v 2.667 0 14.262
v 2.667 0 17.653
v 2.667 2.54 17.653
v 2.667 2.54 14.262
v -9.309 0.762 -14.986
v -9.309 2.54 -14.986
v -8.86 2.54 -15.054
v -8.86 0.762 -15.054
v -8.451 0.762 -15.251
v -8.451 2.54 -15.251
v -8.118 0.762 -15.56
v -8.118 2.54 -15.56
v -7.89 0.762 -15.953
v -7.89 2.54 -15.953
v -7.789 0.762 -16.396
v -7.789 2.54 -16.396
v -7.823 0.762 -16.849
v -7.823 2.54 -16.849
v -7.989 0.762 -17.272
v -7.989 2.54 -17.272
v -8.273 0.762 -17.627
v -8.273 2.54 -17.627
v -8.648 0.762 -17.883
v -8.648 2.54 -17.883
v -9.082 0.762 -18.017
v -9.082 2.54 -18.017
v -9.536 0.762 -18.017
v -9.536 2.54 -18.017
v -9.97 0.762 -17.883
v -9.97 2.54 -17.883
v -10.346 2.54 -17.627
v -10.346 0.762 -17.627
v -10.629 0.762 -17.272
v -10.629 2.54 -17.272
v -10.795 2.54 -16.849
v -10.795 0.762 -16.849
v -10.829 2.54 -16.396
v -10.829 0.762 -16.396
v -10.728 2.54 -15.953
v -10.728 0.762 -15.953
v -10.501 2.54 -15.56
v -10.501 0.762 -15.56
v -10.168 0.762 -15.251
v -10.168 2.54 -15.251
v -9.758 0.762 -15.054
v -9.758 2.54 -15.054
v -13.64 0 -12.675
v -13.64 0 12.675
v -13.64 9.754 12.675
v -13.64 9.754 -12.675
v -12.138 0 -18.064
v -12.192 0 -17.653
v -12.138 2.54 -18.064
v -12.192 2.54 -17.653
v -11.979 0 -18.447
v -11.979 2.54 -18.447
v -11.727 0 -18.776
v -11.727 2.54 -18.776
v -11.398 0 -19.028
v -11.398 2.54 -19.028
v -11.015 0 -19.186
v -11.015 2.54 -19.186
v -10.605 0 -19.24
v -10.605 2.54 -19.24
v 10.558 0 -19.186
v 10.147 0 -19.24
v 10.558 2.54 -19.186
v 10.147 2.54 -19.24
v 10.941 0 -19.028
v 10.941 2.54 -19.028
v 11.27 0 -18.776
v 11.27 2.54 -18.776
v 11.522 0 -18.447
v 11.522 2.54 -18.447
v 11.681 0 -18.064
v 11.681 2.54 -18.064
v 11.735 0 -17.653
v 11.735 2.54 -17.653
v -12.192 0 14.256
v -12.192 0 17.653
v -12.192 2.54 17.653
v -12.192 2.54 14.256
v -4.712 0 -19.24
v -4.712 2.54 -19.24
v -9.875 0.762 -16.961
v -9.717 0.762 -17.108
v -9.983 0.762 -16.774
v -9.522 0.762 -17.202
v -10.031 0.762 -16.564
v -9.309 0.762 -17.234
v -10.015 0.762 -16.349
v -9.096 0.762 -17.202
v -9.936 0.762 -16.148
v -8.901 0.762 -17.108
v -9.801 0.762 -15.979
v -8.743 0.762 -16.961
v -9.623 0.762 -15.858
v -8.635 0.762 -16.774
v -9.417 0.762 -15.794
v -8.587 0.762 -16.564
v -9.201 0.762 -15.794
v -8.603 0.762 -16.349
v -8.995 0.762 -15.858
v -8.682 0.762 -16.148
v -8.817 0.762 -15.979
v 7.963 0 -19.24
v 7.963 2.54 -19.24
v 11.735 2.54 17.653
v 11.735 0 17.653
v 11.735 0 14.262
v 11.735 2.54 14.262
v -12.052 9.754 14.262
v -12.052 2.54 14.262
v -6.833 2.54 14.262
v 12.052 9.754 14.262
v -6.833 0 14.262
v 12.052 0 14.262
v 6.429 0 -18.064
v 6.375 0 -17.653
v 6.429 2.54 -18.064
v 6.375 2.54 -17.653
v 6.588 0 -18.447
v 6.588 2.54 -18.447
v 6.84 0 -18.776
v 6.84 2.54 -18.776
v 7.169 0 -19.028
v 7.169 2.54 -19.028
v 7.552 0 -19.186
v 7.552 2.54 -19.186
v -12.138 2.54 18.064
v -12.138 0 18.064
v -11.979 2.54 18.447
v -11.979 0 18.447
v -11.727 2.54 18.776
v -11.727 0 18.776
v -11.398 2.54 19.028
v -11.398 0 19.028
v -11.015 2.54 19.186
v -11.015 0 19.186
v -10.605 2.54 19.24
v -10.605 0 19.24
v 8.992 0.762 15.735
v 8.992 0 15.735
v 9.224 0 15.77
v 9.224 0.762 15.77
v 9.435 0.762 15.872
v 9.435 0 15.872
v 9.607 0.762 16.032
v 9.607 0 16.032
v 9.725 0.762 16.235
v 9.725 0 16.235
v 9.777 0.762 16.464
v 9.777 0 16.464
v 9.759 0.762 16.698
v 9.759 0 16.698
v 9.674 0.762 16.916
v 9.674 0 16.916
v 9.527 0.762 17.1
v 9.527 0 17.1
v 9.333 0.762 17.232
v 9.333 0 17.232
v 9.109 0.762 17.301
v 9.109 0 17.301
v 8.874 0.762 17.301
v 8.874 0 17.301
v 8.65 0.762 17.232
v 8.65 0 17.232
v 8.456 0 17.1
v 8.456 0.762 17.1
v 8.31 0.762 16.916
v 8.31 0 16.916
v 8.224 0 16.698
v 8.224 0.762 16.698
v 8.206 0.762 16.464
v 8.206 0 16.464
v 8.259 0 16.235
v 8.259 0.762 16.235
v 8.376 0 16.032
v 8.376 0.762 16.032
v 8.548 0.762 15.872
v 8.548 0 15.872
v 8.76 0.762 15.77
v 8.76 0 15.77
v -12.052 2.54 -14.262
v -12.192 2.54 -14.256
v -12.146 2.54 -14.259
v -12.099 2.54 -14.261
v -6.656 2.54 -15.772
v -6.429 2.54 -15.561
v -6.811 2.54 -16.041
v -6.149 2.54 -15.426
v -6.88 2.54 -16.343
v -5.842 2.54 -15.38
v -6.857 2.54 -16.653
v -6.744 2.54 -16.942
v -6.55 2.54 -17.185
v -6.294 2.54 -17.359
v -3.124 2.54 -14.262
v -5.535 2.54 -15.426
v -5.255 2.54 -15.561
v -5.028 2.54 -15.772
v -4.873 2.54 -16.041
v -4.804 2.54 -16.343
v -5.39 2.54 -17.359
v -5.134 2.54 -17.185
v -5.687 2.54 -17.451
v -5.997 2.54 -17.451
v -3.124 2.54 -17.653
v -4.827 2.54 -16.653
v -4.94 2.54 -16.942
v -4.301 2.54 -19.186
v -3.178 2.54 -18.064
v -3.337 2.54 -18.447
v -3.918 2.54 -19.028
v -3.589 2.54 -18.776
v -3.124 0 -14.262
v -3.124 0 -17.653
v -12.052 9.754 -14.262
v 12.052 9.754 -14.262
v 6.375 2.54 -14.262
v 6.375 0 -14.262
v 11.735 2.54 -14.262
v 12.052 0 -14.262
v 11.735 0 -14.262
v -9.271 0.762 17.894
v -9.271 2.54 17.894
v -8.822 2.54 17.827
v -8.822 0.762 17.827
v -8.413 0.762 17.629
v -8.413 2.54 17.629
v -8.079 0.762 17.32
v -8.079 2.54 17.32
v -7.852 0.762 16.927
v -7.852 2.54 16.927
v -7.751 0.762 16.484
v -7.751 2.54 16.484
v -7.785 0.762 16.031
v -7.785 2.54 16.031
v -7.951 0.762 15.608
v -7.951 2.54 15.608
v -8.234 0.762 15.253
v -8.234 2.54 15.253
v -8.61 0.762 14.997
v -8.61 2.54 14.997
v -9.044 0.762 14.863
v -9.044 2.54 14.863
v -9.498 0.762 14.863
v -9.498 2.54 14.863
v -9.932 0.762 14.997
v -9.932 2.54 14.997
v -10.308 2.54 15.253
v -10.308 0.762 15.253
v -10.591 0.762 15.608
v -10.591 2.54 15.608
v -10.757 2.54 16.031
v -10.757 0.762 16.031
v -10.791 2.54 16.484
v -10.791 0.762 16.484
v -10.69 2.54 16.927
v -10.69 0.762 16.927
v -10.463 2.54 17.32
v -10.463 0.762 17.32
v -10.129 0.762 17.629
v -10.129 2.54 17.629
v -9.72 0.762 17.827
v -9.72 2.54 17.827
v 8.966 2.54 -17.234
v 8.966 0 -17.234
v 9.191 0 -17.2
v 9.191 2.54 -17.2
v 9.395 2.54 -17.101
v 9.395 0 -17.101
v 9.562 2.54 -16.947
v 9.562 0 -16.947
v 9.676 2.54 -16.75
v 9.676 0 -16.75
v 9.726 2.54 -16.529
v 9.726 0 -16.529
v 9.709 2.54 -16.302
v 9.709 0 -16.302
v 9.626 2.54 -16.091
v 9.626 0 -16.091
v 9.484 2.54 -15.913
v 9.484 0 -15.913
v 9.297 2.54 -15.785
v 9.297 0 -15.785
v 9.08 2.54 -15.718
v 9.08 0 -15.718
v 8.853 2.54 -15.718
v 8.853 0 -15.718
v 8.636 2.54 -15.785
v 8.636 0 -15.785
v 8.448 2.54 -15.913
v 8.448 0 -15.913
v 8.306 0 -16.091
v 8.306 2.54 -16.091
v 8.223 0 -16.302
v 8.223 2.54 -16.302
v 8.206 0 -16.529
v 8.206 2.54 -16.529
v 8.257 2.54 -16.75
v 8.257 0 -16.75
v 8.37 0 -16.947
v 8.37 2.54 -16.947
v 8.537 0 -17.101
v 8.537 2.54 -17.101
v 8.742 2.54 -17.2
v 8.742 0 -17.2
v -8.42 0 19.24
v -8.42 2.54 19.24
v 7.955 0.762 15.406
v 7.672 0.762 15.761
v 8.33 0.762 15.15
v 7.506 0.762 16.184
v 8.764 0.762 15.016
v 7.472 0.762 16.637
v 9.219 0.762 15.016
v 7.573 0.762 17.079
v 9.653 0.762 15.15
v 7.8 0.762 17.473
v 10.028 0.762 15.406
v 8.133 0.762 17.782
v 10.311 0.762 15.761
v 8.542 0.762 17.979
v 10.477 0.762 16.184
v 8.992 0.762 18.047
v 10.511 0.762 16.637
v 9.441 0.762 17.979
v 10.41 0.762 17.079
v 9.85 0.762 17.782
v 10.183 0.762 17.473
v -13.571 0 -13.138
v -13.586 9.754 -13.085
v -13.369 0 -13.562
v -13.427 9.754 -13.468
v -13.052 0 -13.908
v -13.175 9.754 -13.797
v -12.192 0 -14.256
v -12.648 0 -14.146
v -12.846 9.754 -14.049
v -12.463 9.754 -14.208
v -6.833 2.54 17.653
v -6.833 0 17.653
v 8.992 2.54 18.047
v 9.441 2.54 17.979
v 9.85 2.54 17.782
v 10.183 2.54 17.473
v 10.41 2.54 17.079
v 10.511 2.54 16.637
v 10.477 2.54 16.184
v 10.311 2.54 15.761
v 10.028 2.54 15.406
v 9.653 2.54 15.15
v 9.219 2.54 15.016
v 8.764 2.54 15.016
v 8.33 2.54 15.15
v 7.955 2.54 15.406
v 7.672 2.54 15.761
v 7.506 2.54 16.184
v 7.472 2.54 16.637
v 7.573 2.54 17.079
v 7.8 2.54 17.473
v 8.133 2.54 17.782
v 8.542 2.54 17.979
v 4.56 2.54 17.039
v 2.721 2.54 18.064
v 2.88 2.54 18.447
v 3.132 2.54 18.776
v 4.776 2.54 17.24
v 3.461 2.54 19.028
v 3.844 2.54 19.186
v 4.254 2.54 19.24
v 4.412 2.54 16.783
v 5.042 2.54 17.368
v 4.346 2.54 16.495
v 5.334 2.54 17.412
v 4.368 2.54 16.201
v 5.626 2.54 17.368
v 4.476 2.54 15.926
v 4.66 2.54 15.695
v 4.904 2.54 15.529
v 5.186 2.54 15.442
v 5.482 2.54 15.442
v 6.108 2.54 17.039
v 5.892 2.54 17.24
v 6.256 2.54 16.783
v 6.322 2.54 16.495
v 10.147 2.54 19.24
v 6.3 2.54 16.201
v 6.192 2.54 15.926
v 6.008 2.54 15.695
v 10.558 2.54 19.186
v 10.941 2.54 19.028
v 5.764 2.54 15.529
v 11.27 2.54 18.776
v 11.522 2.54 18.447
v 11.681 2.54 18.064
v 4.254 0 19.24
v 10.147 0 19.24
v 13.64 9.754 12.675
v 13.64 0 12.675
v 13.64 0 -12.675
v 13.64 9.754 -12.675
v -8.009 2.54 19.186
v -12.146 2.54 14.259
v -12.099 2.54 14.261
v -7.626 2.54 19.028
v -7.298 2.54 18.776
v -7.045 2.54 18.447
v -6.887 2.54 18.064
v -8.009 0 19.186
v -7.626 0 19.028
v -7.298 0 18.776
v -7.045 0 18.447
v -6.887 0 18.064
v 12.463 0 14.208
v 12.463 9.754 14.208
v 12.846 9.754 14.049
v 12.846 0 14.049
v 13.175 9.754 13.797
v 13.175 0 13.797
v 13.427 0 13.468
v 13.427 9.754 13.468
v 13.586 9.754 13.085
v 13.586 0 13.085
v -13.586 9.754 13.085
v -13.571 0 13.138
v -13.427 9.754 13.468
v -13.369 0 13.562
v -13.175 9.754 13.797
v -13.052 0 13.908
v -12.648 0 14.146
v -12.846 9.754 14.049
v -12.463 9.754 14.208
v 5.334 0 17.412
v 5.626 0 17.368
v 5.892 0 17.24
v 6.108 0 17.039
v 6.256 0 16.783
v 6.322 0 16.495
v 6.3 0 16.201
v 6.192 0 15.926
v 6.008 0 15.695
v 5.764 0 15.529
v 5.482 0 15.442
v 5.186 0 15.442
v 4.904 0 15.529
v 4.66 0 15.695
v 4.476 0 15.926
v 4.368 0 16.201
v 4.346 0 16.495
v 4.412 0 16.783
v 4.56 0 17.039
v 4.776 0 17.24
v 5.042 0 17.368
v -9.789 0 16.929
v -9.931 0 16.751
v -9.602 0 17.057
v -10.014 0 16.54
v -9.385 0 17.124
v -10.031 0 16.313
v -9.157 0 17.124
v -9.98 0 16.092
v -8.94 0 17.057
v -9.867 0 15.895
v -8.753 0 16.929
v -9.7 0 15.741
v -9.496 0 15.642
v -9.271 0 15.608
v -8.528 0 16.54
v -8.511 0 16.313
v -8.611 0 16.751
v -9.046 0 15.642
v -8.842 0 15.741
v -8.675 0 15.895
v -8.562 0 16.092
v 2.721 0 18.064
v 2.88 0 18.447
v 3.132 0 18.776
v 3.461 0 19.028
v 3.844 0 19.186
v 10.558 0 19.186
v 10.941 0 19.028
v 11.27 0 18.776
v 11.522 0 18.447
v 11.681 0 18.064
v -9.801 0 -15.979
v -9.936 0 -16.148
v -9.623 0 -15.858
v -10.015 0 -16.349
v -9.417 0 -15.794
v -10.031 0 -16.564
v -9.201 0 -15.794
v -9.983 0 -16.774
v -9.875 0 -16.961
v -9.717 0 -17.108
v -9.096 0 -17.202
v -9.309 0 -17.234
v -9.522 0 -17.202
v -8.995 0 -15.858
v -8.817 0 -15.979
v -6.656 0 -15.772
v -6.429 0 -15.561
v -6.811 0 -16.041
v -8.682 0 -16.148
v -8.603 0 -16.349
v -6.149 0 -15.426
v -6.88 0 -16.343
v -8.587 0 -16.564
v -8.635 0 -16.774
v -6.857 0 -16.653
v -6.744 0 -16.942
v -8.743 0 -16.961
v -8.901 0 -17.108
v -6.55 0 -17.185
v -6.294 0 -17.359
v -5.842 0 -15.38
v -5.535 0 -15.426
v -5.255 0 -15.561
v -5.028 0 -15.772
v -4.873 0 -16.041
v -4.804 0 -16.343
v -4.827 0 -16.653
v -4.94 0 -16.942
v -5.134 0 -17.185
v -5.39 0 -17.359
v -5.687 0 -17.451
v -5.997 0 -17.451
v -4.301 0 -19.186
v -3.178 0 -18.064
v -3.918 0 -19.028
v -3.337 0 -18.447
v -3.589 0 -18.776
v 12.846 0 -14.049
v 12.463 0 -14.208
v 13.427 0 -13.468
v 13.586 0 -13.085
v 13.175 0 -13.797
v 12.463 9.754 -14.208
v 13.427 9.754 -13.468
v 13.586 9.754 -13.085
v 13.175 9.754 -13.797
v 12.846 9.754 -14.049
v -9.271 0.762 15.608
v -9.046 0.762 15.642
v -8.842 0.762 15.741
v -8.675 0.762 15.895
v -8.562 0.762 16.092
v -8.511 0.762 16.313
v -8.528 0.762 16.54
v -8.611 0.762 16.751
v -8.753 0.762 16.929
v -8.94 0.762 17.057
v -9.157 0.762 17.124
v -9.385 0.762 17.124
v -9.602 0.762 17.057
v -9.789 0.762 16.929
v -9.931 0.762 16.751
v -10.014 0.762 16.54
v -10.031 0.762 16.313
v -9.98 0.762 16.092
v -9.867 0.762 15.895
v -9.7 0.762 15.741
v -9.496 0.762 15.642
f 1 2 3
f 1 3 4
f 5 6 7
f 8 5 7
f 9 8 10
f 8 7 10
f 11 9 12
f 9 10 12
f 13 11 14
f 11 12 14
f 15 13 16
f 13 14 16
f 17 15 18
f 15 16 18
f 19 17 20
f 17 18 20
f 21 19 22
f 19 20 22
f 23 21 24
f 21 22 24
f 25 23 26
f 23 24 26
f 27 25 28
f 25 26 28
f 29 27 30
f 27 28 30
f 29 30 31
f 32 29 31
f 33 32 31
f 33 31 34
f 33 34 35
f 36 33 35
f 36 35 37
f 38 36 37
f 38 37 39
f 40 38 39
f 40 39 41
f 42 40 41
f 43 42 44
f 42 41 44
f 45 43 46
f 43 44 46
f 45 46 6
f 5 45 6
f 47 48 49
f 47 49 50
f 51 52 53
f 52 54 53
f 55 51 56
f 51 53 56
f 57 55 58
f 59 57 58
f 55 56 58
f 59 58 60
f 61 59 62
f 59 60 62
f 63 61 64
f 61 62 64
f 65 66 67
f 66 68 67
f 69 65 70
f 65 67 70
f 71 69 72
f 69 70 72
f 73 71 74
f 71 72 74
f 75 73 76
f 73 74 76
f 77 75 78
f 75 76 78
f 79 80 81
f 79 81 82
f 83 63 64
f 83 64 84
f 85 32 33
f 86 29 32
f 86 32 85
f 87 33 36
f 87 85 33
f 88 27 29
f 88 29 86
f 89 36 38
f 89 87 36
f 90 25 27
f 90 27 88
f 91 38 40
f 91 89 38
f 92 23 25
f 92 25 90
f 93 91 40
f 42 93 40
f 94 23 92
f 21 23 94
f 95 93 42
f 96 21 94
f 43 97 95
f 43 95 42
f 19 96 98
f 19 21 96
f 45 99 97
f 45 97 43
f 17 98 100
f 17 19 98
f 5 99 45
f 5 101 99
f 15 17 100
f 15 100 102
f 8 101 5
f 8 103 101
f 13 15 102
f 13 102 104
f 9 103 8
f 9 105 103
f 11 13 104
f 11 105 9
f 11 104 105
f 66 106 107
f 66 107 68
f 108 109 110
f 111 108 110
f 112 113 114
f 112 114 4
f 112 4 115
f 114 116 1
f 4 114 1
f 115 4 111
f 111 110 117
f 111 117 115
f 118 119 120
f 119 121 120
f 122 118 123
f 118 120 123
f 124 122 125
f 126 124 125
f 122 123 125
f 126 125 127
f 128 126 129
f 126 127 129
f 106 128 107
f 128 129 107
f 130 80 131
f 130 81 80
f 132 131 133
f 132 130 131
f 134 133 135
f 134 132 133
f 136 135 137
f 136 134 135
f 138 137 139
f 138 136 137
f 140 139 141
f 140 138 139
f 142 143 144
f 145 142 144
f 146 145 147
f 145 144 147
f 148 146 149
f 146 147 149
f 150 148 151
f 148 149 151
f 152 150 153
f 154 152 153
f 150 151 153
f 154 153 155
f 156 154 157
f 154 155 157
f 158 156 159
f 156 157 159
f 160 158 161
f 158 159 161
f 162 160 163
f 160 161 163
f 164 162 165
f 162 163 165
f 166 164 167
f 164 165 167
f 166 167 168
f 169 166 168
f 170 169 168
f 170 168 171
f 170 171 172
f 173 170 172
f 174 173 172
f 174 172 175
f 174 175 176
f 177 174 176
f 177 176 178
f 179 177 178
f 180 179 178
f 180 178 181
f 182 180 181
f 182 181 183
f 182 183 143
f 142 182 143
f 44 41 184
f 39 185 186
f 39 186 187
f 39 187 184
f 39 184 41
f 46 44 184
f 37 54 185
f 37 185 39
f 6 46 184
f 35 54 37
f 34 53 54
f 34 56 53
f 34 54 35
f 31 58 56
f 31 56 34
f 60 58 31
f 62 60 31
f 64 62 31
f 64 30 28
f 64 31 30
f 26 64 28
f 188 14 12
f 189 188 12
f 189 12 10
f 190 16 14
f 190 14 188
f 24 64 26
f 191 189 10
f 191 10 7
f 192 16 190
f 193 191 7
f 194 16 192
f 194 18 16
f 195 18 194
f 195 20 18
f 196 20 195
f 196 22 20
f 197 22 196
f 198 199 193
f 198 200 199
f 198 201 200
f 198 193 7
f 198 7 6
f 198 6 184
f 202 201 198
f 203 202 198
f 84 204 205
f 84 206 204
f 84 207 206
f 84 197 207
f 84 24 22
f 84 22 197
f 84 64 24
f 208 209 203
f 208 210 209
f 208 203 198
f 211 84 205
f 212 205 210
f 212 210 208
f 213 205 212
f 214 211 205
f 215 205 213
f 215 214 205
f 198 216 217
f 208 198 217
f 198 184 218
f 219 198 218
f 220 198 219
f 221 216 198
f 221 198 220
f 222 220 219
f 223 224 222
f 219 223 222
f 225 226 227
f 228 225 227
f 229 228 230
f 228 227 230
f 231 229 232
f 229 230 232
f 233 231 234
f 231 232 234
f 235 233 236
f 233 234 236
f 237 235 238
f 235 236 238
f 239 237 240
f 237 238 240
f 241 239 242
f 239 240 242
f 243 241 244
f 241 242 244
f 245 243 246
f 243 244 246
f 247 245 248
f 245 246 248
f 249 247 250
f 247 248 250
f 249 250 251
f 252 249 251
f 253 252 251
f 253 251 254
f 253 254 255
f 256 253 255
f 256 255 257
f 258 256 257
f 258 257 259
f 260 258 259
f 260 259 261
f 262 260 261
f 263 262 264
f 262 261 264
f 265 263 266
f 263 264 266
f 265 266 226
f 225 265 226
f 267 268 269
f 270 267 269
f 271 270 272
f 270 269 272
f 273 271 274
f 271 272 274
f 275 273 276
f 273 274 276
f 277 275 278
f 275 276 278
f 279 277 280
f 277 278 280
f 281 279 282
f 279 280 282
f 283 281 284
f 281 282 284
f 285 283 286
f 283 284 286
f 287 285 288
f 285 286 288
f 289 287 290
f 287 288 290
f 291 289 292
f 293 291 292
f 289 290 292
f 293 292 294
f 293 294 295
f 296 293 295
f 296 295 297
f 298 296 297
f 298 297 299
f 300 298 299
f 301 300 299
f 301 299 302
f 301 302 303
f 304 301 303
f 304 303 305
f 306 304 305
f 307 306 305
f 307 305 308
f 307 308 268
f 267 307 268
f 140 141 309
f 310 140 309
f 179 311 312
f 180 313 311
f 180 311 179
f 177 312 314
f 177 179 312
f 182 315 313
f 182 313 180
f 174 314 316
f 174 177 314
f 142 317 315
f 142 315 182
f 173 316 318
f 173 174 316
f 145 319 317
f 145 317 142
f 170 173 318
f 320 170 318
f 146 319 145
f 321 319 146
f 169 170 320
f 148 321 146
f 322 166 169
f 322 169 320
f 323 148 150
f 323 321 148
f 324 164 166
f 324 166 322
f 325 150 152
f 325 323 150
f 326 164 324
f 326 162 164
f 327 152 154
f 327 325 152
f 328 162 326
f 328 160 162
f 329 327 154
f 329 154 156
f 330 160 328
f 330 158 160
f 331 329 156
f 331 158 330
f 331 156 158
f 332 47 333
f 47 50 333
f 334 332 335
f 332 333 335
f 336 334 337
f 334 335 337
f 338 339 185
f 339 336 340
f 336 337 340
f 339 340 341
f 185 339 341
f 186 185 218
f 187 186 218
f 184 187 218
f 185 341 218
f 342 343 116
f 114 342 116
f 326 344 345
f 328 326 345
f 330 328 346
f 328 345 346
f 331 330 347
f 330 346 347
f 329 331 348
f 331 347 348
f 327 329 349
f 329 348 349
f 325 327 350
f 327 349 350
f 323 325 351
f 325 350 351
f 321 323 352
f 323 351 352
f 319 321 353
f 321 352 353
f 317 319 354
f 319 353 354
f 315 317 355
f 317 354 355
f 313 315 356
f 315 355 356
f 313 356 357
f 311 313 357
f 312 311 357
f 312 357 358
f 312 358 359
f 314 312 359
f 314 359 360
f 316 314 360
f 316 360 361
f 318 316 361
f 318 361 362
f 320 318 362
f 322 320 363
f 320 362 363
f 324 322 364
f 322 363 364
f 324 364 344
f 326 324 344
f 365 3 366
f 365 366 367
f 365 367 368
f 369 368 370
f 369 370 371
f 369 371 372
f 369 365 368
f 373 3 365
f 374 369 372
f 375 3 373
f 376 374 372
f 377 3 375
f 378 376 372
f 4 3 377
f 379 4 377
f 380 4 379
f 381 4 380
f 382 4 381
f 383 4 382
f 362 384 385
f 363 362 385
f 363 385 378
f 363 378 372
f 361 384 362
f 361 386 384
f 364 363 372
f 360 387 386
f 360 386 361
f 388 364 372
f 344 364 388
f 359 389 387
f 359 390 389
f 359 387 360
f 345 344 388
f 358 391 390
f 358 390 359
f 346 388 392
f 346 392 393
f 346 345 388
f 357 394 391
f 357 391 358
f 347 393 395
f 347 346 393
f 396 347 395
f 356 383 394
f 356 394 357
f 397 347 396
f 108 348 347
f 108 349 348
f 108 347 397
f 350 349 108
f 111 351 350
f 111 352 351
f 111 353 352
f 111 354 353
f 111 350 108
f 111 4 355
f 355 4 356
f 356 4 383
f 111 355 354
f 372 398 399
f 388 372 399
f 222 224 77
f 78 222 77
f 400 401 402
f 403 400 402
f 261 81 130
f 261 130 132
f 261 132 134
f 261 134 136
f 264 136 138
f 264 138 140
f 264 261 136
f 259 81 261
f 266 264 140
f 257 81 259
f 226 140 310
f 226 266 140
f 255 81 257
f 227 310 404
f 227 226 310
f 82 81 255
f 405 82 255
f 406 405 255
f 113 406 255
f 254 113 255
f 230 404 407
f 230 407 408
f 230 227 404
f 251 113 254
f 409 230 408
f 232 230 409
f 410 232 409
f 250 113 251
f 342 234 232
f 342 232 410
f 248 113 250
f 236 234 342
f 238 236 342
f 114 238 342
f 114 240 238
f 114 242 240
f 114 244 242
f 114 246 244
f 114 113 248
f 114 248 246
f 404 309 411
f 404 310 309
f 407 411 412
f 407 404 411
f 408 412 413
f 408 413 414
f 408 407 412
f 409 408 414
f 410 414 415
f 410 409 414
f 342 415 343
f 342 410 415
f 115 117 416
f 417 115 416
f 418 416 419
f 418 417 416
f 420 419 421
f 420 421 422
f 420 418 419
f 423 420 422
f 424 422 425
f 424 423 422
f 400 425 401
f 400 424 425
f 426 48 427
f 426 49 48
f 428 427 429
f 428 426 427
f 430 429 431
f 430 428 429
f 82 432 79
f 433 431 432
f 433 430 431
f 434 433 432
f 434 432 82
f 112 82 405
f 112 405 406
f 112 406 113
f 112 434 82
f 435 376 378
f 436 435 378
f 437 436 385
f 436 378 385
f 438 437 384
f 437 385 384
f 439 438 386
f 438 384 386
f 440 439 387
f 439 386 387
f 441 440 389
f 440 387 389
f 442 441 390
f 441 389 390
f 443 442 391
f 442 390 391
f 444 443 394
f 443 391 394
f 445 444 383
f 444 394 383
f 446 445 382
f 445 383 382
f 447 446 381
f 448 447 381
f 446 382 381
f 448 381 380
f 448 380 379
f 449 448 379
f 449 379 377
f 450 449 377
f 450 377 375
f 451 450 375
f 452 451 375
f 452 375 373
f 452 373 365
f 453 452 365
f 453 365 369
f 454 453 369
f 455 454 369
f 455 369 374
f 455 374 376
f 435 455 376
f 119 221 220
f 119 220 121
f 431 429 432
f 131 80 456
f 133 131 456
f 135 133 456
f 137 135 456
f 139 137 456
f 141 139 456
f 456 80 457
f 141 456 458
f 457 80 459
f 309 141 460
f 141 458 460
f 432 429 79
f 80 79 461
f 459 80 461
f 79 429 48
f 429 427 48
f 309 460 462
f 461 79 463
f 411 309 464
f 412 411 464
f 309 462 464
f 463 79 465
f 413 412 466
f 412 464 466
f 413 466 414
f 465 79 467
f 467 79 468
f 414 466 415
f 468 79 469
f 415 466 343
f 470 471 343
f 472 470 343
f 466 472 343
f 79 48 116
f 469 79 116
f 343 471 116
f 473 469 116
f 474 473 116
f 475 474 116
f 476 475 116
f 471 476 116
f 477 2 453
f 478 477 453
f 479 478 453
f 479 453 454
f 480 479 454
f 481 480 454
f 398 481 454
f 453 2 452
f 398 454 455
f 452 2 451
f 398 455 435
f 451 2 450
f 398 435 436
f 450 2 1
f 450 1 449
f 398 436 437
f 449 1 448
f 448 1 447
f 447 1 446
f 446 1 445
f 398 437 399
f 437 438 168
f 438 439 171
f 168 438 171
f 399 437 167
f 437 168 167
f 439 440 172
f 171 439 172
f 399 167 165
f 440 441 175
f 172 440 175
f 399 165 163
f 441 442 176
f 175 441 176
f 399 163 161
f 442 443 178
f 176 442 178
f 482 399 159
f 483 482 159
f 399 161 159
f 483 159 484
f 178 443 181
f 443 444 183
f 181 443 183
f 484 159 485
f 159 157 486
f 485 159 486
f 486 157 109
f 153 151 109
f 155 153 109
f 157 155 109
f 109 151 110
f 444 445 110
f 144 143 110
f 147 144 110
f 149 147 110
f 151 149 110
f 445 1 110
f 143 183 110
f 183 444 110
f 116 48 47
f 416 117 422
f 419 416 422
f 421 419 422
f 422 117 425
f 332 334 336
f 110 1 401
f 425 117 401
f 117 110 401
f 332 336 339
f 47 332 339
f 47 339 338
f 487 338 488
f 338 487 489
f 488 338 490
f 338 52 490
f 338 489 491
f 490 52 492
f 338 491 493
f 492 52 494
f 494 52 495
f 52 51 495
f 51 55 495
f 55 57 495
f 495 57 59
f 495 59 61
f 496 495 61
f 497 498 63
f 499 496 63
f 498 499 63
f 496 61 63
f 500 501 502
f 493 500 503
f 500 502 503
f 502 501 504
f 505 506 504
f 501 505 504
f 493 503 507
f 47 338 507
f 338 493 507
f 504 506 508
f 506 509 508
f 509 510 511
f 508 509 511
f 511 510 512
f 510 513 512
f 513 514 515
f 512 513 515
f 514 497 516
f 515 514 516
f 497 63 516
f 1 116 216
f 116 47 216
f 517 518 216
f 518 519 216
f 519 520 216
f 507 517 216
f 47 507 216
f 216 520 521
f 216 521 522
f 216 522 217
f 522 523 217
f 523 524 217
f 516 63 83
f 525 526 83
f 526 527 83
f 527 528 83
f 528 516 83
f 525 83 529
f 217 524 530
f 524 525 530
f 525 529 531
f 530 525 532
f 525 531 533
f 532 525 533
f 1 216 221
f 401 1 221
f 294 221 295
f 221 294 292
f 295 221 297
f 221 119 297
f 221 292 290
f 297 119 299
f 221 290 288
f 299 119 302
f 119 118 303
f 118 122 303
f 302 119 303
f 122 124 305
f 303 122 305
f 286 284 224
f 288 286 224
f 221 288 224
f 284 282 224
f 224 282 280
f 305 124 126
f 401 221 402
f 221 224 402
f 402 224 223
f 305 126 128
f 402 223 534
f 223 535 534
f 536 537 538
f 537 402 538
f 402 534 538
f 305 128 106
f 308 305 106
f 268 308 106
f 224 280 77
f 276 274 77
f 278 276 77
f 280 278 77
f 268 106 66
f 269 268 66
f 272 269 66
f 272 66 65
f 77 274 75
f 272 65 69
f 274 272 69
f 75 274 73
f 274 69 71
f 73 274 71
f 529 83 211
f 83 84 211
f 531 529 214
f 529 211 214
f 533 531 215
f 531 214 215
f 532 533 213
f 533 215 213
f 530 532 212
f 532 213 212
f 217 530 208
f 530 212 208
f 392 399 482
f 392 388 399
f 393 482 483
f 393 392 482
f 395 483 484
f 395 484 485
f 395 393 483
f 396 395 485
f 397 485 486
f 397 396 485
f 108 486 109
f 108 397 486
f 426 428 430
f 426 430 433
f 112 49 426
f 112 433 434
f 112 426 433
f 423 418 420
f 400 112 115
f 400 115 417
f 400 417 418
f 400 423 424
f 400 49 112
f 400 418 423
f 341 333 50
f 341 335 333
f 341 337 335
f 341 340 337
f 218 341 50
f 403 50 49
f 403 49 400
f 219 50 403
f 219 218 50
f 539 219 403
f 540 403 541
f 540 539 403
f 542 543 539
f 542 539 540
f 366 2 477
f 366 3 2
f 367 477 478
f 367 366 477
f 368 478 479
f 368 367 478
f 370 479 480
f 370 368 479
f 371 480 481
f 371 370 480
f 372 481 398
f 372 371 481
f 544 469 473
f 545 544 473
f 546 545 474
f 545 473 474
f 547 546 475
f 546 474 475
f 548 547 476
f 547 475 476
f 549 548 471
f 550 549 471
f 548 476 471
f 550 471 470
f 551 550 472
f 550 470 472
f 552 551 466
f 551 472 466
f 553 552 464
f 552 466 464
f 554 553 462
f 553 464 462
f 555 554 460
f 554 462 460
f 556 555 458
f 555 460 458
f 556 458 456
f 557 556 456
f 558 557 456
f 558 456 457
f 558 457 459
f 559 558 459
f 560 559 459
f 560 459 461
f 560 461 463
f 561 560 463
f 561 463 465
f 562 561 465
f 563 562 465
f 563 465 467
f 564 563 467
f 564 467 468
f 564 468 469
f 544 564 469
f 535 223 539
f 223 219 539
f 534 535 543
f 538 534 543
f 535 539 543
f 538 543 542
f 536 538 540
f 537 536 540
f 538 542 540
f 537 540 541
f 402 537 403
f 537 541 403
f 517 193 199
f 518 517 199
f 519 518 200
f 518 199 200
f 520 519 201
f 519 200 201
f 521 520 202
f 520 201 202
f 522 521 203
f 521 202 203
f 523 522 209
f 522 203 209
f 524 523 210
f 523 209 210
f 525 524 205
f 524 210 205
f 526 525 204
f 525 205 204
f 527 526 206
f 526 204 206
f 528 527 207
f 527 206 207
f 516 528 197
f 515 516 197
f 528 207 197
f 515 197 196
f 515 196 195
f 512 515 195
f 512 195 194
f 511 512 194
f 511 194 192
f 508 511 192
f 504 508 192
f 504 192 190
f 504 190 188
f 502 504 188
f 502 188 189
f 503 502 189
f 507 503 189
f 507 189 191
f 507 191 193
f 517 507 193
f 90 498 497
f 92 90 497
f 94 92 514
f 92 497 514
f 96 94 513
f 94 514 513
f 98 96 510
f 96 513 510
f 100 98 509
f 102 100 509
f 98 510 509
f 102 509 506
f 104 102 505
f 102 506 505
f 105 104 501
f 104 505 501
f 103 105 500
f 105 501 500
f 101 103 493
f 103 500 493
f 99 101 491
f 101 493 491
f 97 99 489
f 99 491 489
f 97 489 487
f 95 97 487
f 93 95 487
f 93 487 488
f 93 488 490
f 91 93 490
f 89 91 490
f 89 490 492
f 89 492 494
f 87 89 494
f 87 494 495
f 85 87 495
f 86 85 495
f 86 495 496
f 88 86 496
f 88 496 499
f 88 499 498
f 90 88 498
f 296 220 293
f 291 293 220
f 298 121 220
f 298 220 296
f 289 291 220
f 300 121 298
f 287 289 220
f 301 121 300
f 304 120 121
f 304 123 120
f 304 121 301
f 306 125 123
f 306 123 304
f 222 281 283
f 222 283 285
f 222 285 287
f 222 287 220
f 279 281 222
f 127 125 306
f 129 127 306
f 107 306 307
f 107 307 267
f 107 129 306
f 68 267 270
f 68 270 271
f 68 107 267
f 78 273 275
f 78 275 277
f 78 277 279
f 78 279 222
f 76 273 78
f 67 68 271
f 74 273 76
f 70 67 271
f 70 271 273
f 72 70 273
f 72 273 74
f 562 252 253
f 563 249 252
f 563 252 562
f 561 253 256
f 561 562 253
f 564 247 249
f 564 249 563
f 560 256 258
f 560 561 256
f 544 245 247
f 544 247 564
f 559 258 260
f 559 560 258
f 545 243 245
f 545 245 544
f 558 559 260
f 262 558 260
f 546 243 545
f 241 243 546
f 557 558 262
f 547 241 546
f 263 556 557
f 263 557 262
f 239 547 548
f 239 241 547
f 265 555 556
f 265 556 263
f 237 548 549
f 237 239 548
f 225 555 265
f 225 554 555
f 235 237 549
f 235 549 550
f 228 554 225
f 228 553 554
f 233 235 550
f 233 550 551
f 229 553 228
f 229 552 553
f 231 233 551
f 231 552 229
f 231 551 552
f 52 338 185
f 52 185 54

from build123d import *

# Parameters (mm, degrees)
SKETCH1_W                  = 27.2796
SKETCH1_H                  = 28.5242
ENCLOSURE_DEPTH            = 9.7536
SKETCH2_W                  = 9.0678
SKETCH2_H                  = 4.9784
SKETCH2_W_2                = 5.3594
MOUNTING_TABS_DEPTH        = 2.54
SMALL_MOUNTING_HOLES_REACH = 26.663
SKETCH3_R                  = 1.0414
SKETCH3_R_2                = 0.9906
LARGE_MOUNTING_HOLES_REACH = 27.522
SKETCH4_R                  = 0.762
SKETCH4_R_2                = 0.7874
SKETCH4_R_3                = 0.7239
SKETCH5_R                  = 1.524
CUT_EXTRUDE1_DEPTH         = 1.778
FILLET1_R                  = 1.5875
FILLET2_R                  = 1.5875


with BuildPart() as part:
    # Sketch1 → Enclosure (new body)
    with BuildSketch(Plane(origin=(0, 0, 0), x_dir=(1, 0, 0), z_dir=(0, 1, 0))):
        Rectangle(SKETCH1_W, SKETCH1_H)
    extrude(amount=ENCLOSURE_DEPTH)

    # Sketch2 → Mounting Tabs (add)
    with BuildSketch(Plane(origin=(0, 0, 0), x_dir=(1, 0, 0), z_dir=(0, 1, 0))):
        with Locations((-7.6581, 16.7513)):
            Rectangle(SKETCH2_W, SKETCH2_H)
        with Locations((9.0551, 16.7513)):
            Rectangle(SKETCH2_W_2, SKETCH2_H)
        with Locations((-9.5123, -16.7513)):
            Rectangle(SKETCH2_W_2, SKETCH2_H)
        with Locations((7.2009, -16.7513)):
            Rectangle(SKETCH2_W, SKETCH2_H)
    extrude(amount=MOUNTING_TABS_DEPTH)

    # Sketch3 → Small Mounting Holes (cut, up to next)
    with BuildSketch(Plane(origin=(0, 2.54, 0), x_dir=(1, 0, 0), z_dir=(0, 1, 0)), mode=Mode.PRIVATE) as small_mounting_holes_sk1:
        with Locations(Location((-5.842, 16.4211, 0), (0, 0, 270))):
            Circle(SKETCH3_R)
    small_mounting_holes_tool1 = extrude(small_mounting_holes_sk1.sketch, amount=-SMALL_MOUNTING_HOLES_REACH, mode=Mode.PRIVATE) & part.part
    # Sketch3 → Small Mounting Holes (cut, up to next)
    with BuildSketch(Plane(origin=(0, 2.54, 0), x_dir=(1, 0, 0), z_dir=(0, 1, 0)), mode=Mode.PRIVATE) as small_mounting_holes_sk2:
        with Locations(Location((5.334, -16.4211, 0), (0, 0, 270))):
            Circle(SKETCH3_R_2)
    small_mounting_holes_tool2 = extrude(small_mounting_holes_sk2.sketch, amount=-SMALL_MOUNTING_HOLES_REACH, mode=Mode.PRIVATE) & part.part
    add(small_mounting_holes_tool1.solids().sort_by_distance((-5.842, 2.54, -16.4211))[0], mode=Mode.SUBTRACT)
    add(small_mounting_holes_tool2.solids().sort_by_distance((5.334, 2.54, 16.4211))[0], mode=Mode.SUBTRACT)

    # Sketch4 → Large Mounting Holes (cut, up to next)
    with BuildSketch(Plane.XZ, mode=Mode.PRIVATE) as large_mounting_holes_sk1:
        with Locations(Location((-9.271, 16.3703, 0), (0, 0, 270))):
            Circle(SKETCH4_R)
    large_mounting_holes_tool1 = extrude(large_mounting_holes_sk1.sketch, amount=-LARGE_MOUNTING_HOLES_REACH, mode=Mode.PRIVATE) & part.part
    # Sketch4 → Large Mounting Holes (cut, up to next)
    with BuildSketch(Plane.XZ, mode=Mode.PRIVATE) as large_mounting_holes_sk2:
        with Locations(Location((8.9916, 16.5227, 0), (0, 0, 270))):
            Circle(SKETCH4_R_2)
    large_mounting_holes_tool2 = extrude(large_mounting_holes_sk2.sketch, amount=-LARGE_MOUNTING_HOLES_REACH, mode=Mode.PRIVATE) & part.part
    # Sketch4 → Large Mounting Holes (cut, up to next)
    with BuildSketch(Plane.XZ, mode=Mode.PRIVATE) as large_mounting_holes_sk3:
        with Locations(Location((8.9662, -16.4719, 0), (0, 0, 270))):
            Circle(SKETCH4_R)
    large_mounting_holes_tool3 = extrude(large_mounting_holes_sk3.sketch, amount=-LARGE_MOUNTING_HOLES_REACH, mode=Mode.PRIVATE) & part.part
    # Sketch4 → Large Mounting Holes (cut, up to next)
    with BuildSketch(Plane.XZ, mode=Mode.PRIVATE) as large_mounting_holes_sk4:
        with Locations(Location((-9.3091, -16.51, 0), (0, 0, 270))):
            Circle(SKETCH4_R_3)
    large_mounting_holes_tool4 = extrude(large_mounting_holes_sk4.sketch, amount=-LARGE_MOUNTING_HOLES_REACH, mode=Mode.PRIVATE) & part.part
    add(large_mounting_holes_tool1.solids().sort_by_distance((-9.271, 0, 16.3703))[0], mode=Mode.SUBTRACT)
    add(large_mounting_holes_tool2.solids().sort_by_distance((8.9916, 0, 16.5227))[0], mode=Mode.SUBTRACT)
    add(large_mounting_holes_tool3.solids().sort_by_distance((8.9662, 0, -16.4719))[0], mode=Mode.SUBTRACT)
    add(large_mounting_holes_tool4.solids().sort_by_distance((-9.3091, 0, -16.51))[0], mode=Mode.SUBTRACT)

    # Sketch5 → Cut-Extrude1 (cut)
    with BuildSketch(Plane(origin=(0, 2.54, 0), x_dir=(1, 0, 0), z_dir=(0, 1, 0))):
        with Locations(Location((-9.271, -16.3703, 0), (0, 0, 270))):
            Circle(SKETCH5_R)
        with Locations(Location((8.9916, -16.5227, 0), (0, 0, 270))):
            Circle(SKETCH5_R)
        with Locations(Location((-9.3091, 16.51, 0), (0, 0, 270))):
            Circle(SKETCH5_R)
    extrude(amount=-CUT_EXTRUDE1_DEPTH, mode=Mode.SUBTRACT)

    # Fillet1
    fillet1_edges = [part.edges().sort_by_distance(p)[0] for p in [
        (-13.6398, 4.8768, -14.2621),
        (13.6398, 4.8768, -14.2621),
        (-13.6398, 4.8768, 14.2621),
        (13.6398, 4.8768, 14.2621),
    ]]
    fillet(fillet1_edges, radius=FILLET1_R)

    # Fillet2
    fillet2_edges = [part.edges().sort_by_distance(p)[0] for p in [
        (-12.192, 1.27, 19.2405),
        (2.667, 1.27, 19.2405),
        (-6.8326, 1.27, 19.2405),
        (11.7348, 1.27, 19.2405),
        (-12.192, 1.27, -19.2405),
        (-3.1242, 1.27, -19.2405),
        (6.3754, 1.27, -19.2405),
        (11.7348, 1.27, -19.2405),
    ]]
    fillet(fillet2_edges, radius=FILLET2_R)


solid = part.part
